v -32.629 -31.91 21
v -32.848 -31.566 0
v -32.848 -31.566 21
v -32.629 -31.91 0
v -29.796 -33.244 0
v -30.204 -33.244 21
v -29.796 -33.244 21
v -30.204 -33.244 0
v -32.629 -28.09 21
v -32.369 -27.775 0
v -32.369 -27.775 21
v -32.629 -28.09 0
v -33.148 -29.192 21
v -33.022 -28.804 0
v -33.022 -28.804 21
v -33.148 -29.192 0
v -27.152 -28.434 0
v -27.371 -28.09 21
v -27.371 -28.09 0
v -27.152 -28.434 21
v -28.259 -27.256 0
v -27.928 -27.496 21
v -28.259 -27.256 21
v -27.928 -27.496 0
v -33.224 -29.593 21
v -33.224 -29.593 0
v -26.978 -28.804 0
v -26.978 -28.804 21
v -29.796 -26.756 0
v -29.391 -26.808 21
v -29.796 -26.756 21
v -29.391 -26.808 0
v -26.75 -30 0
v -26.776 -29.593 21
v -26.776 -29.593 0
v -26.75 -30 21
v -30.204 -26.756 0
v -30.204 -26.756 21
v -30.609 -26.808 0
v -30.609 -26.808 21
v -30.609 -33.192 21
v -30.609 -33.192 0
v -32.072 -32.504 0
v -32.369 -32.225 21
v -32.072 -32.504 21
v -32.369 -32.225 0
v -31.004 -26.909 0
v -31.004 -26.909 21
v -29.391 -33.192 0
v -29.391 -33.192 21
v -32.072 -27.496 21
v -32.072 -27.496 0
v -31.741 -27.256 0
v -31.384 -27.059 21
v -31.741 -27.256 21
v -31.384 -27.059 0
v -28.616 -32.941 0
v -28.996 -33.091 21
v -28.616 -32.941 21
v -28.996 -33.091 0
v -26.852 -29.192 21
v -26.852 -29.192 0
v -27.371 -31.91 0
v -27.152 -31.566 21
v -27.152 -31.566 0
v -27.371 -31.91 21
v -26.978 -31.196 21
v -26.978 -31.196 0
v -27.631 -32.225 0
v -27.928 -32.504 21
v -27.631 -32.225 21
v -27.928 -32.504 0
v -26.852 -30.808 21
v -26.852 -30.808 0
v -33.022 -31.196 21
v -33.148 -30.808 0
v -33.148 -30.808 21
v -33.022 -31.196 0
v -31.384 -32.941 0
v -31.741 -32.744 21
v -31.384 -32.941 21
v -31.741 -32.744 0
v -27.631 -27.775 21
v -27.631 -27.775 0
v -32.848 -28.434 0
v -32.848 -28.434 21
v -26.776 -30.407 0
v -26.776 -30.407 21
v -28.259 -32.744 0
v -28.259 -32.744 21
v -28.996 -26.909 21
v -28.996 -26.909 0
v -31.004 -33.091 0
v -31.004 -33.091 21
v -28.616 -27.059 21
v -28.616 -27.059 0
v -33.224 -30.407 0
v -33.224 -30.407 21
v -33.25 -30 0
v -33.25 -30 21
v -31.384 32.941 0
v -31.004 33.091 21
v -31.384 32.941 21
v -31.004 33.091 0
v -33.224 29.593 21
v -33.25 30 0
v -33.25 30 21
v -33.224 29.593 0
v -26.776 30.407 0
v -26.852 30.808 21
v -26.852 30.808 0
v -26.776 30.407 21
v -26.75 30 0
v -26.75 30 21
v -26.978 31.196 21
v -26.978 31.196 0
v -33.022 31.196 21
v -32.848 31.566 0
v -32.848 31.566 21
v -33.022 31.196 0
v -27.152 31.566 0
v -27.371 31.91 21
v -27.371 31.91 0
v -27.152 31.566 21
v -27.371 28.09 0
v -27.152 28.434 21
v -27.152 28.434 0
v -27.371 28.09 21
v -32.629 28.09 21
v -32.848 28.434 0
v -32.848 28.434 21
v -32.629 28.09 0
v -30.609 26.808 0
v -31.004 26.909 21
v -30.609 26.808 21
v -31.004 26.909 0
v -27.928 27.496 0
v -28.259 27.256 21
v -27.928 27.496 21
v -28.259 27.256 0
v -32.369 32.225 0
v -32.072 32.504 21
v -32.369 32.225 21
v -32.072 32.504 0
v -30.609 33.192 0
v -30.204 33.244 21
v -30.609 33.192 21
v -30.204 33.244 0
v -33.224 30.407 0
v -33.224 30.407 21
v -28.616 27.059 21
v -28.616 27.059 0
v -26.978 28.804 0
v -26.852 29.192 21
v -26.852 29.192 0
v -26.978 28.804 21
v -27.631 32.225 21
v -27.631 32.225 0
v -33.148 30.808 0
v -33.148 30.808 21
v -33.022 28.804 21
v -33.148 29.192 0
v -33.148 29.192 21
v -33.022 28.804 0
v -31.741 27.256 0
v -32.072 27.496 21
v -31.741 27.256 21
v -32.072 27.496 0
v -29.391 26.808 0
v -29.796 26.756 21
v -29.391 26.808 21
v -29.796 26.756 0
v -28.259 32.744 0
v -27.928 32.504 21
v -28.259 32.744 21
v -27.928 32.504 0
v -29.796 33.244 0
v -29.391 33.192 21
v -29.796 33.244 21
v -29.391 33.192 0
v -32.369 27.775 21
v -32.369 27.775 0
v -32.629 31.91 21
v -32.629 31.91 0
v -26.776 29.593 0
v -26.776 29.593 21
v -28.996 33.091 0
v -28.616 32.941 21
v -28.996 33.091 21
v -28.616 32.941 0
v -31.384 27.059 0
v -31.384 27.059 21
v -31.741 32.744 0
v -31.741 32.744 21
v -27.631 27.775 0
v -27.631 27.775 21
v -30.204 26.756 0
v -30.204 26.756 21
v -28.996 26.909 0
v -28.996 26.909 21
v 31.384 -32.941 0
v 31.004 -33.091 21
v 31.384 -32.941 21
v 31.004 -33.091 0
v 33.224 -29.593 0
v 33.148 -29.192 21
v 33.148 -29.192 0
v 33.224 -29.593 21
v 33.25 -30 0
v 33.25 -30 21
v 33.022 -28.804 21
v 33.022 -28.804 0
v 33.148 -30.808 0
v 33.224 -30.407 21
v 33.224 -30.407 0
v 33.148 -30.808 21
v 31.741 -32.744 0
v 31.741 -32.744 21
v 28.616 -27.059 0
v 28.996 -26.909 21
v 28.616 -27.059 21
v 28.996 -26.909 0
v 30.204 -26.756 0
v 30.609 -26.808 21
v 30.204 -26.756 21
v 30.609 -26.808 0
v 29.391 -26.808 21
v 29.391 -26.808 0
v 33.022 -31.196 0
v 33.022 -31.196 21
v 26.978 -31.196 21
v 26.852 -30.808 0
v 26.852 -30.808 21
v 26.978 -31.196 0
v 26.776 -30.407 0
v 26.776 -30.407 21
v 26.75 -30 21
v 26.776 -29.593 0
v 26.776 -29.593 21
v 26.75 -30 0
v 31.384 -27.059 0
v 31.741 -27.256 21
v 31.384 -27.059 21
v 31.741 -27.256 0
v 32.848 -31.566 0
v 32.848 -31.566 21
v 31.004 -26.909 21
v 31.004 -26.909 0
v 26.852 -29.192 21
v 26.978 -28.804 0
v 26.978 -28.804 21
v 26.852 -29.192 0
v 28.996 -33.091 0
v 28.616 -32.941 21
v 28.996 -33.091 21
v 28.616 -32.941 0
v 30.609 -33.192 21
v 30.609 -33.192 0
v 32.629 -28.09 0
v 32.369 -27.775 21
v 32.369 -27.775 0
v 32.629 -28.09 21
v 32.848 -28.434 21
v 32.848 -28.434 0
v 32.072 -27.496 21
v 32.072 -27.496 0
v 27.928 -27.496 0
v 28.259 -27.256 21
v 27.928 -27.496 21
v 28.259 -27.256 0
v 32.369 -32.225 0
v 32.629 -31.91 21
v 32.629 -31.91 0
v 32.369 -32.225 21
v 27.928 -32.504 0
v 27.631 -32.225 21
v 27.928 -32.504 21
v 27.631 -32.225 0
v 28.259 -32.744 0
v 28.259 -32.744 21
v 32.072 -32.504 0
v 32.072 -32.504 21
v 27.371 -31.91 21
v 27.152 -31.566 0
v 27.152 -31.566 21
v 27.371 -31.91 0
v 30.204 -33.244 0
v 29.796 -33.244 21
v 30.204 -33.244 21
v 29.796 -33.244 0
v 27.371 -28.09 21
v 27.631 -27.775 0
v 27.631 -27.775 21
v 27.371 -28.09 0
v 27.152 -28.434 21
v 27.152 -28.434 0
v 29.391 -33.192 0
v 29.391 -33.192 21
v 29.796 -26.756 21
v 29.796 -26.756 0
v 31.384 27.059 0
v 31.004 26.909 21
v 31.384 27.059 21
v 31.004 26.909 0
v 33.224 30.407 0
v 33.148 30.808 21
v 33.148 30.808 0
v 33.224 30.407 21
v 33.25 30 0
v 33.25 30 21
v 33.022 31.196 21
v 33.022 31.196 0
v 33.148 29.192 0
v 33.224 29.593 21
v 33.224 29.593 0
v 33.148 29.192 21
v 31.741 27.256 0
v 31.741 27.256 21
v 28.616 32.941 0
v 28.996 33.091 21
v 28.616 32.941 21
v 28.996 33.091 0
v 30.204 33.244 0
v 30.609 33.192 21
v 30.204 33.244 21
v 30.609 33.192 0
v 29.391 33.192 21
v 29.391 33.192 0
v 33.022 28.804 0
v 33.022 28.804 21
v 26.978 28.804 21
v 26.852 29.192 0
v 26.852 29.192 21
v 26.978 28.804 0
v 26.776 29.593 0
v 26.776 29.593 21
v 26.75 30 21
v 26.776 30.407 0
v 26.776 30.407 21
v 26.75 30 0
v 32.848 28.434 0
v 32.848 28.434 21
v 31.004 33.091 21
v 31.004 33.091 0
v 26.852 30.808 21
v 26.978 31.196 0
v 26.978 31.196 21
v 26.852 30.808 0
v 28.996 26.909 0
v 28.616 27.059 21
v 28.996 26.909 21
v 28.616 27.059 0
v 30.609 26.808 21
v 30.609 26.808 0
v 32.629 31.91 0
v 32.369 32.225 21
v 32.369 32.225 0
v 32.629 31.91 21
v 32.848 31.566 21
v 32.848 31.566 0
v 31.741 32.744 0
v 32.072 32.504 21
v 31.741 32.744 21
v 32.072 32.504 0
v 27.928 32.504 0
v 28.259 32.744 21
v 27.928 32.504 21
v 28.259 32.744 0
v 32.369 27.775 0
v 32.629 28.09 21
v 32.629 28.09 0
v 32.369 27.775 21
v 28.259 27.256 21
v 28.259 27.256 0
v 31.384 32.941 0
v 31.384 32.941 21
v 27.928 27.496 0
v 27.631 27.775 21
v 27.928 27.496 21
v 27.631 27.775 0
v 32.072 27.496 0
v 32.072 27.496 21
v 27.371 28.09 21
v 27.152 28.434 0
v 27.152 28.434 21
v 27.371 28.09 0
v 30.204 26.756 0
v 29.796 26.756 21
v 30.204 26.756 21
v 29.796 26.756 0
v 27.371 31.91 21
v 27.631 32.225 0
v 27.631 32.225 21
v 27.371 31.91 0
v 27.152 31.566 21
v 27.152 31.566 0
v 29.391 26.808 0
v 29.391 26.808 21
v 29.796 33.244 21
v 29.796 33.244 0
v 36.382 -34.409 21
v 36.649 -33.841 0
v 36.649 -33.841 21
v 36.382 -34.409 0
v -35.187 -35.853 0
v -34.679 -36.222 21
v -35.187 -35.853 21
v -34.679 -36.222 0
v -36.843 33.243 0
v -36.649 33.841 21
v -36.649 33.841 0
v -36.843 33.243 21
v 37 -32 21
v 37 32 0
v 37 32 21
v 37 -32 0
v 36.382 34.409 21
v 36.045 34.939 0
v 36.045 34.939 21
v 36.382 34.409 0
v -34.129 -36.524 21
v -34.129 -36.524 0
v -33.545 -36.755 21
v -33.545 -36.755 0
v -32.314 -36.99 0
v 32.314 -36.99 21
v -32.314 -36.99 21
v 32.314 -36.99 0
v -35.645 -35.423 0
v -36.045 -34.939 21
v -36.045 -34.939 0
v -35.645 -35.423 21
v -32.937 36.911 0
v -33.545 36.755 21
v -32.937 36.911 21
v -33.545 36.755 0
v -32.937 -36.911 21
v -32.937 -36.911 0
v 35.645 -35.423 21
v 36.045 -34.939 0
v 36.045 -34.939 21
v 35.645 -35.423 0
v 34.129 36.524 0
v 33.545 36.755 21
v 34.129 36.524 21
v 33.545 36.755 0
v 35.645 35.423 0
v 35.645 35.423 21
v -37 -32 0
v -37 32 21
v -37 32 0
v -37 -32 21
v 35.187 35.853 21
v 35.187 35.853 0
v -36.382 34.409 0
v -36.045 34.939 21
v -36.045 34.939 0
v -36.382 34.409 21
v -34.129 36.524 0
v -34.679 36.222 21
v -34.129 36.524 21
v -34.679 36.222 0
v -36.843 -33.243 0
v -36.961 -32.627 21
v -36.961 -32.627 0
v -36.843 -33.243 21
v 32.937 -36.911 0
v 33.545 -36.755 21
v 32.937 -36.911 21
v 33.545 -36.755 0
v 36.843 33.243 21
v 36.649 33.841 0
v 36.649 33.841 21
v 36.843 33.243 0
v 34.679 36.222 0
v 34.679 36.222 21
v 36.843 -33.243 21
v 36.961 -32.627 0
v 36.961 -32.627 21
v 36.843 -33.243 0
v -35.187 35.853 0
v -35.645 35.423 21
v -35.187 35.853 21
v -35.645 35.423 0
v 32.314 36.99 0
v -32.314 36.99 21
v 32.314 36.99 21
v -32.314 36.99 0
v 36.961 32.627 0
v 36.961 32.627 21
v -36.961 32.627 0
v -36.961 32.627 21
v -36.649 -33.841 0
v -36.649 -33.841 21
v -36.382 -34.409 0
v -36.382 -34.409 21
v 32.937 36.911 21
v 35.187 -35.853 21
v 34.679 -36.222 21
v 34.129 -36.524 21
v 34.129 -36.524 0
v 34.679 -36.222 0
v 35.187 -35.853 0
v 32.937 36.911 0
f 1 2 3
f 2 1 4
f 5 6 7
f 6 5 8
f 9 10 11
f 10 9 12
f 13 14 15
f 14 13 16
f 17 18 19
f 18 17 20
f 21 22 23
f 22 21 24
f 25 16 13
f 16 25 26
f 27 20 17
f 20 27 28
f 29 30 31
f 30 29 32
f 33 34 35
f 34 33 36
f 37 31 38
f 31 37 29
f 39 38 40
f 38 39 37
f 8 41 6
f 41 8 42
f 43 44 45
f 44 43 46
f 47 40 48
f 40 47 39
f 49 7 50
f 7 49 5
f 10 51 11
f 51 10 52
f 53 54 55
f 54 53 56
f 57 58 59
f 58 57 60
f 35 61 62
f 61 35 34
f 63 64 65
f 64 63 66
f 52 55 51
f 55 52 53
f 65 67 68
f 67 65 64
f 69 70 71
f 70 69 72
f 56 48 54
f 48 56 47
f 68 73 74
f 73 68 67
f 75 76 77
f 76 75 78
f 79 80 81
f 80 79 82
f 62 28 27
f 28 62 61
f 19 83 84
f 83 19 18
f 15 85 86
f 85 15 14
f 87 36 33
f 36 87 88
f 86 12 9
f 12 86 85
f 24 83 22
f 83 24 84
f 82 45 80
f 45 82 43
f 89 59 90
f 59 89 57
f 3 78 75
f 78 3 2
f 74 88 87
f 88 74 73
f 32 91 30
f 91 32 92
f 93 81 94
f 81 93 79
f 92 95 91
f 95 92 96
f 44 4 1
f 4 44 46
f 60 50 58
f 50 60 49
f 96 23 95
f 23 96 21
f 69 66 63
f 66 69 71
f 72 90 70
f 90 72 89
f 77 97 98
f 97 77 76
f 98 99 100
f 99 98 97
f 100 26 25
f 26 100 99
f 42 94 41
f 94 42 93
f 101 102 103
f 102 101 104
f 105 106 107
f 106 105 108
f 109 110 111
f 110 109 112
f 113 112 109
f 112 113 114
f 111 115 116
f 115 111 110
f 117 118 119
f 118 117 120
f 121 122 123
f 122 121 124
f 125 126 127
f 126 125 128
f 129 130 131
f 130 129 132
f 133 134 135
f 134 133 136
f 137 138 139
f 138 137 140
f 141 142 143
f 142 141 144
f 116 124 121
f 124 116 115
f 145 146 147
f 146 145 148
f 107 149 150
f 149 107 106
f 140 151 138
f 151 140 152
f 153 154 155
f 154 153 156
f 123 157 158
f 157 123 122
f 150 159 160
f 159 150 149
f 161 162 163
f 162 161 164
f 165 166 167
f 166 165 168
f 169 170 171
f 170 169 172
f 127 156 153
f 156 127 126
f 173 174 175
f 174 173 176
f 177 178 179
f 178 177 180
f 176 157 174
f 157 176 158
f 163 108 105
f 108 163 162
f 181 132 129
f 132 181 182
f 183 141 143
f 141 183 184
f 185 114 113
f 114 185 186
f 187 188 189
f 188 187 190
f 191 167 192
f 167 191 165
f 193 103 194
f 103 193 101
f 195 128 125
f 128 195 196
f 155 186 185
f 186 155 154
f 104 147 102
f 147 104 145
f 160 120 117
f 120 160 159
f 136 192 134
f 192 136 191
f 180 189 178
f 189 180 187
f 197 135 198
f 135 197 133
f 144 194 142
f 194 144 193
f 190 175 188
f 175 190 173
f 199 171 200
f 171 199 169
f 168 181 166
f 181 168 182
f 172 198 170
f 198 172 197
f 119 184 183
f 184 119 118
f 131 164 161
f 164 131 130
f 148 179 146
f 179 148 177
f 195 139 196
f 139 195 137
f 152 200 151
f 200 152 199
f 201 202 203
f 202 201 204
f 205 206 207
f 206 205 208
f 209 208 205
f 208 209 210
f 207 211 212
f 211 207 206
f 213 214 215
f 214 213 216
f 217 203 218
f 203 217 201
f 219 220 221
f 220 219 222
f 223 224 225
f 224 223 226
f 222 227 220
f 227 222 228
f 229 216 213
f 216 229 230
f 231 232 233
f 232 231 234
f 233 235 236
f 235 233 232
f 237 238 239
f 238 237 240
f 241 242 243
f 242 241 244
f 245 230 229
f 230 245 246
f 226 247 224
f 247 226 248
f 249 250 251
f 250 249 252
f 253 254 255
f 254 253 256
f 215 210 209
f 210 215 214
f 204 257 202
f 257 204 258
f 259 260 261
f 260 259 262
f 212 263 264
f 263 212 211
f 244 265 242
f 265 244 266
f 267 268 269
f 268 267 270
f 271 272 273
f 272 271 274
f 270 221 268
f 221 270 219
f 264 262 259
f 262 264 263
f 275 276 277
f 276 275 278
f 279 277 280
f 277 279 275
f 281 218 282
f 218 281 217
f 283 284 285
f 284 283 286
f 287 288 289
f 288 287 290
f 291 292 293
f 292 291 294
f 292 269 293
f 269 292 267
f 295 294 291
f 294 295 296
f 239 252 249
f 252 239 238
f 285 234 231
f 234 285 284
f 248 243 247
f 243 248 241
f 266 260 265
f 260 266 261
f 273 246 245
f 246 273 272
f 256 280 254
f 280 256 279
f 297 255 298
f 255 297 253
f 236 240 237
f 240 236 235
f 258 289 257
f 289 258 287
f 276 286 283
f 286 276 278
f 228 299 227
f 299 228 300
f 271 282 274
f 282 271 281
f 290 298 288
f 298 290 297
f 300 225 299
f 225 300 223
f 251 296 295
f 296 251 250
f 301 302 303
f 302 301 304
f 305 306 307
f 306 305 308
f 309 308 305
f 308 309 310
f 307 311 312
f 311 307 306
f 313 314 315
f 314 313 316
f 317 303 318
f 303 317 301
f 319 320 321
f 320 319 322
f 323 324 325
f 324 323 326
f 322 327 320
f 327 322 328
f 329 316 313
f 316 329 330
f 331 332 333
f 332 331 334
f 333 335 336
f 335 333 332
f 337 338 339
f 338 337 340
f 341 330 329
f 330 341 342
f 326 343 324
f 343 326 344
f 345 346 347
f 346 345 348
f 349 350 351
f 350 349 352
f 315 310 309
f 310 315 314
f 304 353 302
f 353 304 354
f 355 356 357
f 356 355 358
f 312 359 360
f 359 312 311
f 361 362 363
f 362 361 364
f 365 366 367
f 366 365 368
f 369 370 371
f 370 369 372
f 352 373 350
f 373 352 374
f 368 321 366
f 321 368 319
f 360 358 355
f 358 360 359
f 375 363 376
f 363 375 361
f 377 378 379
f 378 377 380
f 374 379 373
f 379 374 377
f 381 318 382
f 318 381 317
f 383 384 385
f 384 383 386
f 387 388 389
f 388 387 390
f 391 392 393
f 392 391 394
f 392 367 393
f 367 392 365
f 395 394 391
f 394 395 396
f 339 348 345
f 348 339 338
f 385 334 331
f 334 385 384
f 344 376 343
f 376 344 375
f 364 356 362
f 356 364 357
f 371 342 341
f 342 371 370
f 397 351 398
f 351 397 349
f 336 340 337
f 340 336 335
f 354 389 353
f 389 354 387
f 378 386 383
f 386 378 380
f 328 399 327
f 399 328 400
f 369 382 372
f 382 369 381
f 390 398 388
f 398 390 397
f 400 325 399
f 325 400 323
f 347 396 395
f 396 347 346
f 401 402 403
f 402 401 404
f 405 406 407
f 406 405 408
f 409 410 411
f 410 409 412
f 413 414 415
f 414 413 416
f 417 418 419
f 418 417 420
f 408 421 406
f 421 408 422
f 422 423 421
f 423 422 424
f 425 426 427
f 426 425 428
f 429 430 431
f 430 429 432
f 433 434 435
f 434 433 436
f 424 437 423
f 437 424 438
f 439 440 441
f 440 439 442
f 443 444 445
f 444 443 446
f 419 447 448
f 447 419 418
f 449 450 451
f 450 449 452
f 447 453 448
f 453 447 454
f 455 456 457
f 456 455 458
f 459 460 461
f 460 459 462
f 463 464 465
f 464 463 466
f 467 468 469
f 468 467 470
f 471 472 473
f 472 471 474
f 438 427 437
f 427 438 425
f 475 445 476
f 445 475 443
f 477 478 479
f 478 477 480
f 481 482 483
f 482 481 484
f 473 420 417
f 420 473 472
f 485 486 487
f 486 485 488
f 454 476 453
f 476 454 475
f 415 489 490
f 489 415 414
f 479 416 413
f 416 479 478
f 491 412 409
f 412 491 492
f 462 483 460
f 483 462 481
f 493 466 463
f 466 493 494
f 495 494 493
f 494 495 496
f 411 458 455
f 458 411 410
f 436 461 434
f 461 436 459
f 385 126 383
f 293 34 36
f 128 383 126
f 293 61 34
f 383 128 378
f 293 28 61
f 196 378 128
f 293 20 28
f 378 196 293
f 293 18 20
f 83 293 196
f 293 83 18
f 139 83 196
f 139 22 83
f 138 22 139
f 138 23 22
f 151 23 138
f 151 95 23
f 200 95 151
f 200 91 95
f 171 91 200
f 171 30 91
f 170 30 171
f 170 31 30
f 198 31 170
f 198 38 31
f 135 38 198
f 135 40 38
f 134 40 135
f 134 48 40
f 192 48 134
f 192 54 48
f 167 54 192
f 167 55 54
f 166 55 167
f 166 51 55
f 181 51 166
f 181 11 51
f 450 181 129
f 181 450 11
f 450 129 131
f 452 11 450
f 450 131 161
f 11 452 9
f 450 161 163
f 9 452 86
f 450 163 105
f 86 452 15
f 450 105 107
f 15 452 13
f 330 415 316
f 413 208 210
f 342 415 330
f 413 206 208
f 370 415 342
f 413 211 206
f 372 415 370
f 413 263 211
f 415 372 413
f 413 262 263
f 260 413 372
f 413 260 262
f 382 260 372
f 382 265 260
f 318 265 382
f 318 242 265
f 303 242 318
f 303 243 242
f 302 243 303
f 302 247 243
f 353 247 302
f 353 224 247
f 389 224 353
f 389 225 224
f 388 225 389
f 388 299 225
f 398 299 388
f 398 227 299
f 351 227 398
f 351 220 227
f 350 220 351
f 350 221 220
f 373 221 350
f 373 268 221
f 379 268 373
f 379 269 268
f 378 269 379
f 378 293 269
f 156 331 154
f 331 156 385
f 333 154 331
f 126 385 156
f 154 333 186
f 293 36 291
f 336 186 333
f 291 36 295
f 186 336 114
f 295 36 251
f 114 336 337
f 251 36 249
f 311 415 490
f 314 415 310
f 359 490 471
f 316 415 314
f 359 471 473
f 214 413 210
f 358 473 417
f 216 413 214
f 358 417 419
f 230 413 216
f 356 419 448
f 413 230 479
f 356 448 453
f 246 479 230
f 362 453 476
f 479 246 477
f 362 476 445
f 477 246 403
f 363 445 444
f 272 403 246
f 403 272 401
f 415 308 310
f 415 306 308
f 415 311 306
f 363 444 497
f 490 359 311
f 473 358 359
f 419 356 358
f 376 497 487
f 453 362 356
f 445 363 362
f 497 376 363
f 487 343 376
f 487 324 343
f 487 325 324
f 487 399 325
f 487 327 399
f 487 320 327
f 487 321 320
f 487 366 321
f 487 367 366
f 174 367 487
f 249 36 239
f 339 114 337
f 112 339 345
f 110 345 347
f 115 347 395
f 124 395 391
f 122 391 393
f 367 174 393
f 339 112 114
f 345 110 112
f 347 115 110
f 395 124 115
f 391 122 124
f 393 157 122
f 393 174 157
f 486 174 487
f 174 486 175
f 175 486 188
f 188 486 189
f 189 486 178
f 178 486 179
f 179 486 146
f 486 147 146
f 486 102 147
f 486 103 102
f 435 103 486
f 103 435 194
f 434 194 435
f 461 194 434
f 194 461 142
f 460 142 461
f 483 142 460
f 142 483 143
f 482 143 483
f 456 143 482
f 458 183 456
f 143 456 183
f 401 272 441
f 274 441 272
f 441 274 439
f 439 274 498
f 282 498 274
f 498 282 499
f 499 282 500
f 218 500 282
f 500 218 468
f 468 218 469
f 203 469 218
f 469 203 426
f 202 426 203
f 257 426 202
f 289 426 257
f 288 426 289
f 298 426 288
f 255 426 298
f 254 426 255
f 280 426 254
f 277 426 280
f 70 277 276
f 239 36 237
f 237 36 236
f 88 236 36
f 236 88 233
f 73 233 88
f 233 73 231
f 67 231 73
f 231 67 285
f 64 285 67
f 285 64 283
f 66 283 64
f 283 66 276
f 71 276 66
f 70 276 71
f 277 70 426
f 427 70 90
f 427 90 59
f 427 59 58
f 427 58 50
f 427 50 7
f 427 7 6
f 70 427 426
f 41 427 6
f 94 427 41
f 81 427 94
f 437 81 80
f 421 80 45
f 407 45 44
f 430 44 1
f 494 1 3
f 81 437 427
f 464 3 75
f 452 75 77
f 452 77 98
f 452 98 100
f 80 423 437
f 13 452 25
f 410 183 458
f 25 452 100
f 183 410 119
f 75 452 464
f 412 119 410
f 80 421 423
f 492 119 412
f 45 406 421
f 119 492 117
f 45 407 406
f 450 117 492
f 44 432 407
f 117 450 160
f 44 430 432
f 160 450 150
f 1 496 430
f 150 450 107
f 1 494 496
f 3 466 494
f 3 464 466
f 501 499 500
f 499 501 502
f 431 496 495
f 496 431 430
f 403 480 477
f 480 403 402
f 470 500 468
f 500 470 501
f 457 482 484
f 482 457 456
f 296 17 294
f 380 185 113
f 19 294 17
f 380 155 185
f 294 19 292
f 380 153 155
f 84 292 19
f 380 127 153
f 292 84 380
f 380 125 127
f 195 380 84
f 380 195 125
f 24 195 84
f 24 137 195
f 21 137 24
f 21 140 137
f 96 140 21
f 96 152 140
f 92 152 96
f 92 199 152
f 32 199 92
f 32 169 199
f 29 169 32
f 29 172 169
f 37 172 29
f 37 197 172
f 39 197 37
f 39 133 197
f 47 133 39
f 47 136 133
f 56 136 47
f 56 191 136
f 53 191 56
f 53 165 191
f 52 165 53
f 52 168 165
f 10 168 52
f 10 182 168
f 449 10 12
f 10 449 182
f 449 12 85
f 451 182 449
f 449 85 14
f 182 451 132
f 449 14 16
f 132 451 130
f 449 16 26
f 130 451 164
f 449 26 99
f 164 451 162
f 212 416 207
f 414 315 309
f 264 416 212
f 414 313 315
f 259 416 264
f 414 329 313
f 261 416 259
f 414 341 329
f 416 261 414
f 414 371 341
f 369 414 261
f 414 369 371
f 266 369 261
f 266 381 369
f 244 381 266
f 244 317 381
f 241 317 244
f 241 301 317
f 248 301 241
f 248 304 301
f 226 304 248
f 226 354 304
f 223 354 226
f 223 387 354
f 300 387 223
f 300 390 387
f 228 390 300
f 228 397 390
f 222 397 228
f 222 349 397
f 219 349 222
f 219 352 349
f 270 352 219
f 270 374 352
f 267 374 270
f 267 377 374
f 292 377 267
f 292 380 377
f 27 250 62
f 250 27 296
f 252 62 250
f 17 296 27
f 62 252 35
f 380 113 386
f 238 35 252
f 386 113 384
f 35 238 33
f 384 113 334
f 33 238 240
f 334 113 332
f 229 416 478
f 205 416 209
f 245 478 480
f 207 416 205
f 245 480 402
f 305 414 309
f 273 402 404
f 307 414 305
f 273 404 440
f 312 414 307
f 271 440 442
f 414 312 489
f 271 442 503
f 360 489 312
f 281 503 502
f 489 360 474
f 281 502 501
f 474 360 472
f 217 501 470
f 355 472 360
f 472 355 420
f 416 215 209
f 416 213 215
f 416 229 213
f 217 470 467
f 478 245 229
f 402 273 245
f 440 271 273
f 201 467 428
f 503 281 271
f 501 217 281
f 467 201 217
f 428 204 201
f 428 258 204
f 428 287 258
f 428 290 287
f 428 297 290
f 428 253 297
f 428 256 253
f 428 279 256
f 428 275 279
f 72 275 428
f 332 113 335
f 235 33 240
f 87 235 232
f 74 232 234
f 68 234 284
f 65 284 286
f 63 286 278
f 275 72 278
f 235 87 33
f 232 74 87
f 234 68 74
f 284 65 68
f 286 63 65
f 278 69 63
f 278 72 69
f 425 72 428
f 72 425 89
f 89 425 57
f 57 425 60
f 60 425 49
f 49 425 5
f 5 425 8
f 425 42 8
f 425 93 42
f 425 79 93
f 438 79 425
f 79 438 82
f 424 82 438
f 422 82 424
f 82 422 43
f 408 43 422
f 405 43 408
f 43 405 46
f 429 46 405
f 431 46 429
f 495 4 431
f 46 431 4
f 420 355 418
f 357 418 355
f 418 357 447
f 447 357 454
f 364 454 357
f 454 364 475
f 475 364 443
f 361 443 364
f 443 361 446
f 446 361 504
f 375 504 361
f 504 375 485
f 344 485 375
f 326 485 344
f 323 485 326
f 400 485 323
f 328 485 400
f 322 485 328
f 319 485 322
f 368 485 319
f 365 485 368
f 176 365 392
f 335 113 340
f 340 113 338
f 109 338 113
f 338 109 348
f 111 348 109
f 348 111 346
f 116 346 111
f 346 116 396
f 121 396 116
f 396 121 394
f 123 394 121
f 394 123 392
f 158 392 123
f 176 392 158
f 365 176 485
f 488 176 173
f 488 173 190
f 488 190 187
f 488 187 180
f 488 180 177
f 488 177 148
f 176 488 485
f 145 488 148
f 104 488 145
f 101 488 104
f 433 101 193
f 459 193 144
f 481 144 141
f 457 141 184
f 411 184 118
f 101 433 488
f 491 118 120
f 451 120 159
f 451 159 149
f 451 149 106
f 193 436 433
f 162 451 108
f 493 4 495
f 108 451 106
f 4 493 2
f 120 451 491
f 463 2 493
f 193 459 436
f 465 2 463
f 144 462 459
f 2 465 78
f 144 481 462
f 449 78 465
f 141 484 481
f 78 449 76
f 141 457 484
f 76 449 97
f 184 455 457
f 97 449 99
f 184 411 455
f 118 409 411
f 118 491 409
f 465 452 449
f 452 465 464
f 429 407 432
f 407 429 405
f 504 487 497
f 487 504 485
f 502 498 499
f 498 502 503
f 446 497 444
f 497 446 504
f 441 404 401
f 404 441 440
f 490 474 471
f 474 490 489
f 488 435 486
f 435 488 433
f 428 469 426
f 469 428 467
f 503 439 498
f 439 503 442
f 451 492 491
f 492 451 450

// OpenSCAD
$fn = 50;


difference() {
	union() {
		hull() {
			translate(v = [-32.0000000000, 32.0000000000, 0]) {
				cylinder(h = 21, r = 5);
			}
			translate(v = [32.0000000000, 32.0000000000, 0]) {
				cylinder(h = 21, r = 5);
			}
			translate(v = [-32.0000000000, -32.0000000000, 0]) {
				cylinder(h = 21, r = 5);
			}
			translate(v = [32.0000000000, -32.0000000000, 0]) {
				cylinder(h = 21, r = 5);
			}
		}
	}
	union() {
		translate(v = [-30.0000000000, -30.0000000000, -100.0000000000]) {
			cylinder(h = 200, r = 3.2500000000);
		}
		translate(v = [-30.0000000000, 30.0000000000, -100.0000000000]) {
			cylinder(h = 200, r = 3.2500000000);
		}
		translate(v = [30.0000000000, -30.0000000000, -100.0000000000]) {
			cylinder(h = 200, r = 3.2500000000);
		}
		translate(v = [30.0000000000, 30.0000000000, -100.0000000000]) {
			cylinder(h = 200, r = 3.2500000000);
		}
	}
}
